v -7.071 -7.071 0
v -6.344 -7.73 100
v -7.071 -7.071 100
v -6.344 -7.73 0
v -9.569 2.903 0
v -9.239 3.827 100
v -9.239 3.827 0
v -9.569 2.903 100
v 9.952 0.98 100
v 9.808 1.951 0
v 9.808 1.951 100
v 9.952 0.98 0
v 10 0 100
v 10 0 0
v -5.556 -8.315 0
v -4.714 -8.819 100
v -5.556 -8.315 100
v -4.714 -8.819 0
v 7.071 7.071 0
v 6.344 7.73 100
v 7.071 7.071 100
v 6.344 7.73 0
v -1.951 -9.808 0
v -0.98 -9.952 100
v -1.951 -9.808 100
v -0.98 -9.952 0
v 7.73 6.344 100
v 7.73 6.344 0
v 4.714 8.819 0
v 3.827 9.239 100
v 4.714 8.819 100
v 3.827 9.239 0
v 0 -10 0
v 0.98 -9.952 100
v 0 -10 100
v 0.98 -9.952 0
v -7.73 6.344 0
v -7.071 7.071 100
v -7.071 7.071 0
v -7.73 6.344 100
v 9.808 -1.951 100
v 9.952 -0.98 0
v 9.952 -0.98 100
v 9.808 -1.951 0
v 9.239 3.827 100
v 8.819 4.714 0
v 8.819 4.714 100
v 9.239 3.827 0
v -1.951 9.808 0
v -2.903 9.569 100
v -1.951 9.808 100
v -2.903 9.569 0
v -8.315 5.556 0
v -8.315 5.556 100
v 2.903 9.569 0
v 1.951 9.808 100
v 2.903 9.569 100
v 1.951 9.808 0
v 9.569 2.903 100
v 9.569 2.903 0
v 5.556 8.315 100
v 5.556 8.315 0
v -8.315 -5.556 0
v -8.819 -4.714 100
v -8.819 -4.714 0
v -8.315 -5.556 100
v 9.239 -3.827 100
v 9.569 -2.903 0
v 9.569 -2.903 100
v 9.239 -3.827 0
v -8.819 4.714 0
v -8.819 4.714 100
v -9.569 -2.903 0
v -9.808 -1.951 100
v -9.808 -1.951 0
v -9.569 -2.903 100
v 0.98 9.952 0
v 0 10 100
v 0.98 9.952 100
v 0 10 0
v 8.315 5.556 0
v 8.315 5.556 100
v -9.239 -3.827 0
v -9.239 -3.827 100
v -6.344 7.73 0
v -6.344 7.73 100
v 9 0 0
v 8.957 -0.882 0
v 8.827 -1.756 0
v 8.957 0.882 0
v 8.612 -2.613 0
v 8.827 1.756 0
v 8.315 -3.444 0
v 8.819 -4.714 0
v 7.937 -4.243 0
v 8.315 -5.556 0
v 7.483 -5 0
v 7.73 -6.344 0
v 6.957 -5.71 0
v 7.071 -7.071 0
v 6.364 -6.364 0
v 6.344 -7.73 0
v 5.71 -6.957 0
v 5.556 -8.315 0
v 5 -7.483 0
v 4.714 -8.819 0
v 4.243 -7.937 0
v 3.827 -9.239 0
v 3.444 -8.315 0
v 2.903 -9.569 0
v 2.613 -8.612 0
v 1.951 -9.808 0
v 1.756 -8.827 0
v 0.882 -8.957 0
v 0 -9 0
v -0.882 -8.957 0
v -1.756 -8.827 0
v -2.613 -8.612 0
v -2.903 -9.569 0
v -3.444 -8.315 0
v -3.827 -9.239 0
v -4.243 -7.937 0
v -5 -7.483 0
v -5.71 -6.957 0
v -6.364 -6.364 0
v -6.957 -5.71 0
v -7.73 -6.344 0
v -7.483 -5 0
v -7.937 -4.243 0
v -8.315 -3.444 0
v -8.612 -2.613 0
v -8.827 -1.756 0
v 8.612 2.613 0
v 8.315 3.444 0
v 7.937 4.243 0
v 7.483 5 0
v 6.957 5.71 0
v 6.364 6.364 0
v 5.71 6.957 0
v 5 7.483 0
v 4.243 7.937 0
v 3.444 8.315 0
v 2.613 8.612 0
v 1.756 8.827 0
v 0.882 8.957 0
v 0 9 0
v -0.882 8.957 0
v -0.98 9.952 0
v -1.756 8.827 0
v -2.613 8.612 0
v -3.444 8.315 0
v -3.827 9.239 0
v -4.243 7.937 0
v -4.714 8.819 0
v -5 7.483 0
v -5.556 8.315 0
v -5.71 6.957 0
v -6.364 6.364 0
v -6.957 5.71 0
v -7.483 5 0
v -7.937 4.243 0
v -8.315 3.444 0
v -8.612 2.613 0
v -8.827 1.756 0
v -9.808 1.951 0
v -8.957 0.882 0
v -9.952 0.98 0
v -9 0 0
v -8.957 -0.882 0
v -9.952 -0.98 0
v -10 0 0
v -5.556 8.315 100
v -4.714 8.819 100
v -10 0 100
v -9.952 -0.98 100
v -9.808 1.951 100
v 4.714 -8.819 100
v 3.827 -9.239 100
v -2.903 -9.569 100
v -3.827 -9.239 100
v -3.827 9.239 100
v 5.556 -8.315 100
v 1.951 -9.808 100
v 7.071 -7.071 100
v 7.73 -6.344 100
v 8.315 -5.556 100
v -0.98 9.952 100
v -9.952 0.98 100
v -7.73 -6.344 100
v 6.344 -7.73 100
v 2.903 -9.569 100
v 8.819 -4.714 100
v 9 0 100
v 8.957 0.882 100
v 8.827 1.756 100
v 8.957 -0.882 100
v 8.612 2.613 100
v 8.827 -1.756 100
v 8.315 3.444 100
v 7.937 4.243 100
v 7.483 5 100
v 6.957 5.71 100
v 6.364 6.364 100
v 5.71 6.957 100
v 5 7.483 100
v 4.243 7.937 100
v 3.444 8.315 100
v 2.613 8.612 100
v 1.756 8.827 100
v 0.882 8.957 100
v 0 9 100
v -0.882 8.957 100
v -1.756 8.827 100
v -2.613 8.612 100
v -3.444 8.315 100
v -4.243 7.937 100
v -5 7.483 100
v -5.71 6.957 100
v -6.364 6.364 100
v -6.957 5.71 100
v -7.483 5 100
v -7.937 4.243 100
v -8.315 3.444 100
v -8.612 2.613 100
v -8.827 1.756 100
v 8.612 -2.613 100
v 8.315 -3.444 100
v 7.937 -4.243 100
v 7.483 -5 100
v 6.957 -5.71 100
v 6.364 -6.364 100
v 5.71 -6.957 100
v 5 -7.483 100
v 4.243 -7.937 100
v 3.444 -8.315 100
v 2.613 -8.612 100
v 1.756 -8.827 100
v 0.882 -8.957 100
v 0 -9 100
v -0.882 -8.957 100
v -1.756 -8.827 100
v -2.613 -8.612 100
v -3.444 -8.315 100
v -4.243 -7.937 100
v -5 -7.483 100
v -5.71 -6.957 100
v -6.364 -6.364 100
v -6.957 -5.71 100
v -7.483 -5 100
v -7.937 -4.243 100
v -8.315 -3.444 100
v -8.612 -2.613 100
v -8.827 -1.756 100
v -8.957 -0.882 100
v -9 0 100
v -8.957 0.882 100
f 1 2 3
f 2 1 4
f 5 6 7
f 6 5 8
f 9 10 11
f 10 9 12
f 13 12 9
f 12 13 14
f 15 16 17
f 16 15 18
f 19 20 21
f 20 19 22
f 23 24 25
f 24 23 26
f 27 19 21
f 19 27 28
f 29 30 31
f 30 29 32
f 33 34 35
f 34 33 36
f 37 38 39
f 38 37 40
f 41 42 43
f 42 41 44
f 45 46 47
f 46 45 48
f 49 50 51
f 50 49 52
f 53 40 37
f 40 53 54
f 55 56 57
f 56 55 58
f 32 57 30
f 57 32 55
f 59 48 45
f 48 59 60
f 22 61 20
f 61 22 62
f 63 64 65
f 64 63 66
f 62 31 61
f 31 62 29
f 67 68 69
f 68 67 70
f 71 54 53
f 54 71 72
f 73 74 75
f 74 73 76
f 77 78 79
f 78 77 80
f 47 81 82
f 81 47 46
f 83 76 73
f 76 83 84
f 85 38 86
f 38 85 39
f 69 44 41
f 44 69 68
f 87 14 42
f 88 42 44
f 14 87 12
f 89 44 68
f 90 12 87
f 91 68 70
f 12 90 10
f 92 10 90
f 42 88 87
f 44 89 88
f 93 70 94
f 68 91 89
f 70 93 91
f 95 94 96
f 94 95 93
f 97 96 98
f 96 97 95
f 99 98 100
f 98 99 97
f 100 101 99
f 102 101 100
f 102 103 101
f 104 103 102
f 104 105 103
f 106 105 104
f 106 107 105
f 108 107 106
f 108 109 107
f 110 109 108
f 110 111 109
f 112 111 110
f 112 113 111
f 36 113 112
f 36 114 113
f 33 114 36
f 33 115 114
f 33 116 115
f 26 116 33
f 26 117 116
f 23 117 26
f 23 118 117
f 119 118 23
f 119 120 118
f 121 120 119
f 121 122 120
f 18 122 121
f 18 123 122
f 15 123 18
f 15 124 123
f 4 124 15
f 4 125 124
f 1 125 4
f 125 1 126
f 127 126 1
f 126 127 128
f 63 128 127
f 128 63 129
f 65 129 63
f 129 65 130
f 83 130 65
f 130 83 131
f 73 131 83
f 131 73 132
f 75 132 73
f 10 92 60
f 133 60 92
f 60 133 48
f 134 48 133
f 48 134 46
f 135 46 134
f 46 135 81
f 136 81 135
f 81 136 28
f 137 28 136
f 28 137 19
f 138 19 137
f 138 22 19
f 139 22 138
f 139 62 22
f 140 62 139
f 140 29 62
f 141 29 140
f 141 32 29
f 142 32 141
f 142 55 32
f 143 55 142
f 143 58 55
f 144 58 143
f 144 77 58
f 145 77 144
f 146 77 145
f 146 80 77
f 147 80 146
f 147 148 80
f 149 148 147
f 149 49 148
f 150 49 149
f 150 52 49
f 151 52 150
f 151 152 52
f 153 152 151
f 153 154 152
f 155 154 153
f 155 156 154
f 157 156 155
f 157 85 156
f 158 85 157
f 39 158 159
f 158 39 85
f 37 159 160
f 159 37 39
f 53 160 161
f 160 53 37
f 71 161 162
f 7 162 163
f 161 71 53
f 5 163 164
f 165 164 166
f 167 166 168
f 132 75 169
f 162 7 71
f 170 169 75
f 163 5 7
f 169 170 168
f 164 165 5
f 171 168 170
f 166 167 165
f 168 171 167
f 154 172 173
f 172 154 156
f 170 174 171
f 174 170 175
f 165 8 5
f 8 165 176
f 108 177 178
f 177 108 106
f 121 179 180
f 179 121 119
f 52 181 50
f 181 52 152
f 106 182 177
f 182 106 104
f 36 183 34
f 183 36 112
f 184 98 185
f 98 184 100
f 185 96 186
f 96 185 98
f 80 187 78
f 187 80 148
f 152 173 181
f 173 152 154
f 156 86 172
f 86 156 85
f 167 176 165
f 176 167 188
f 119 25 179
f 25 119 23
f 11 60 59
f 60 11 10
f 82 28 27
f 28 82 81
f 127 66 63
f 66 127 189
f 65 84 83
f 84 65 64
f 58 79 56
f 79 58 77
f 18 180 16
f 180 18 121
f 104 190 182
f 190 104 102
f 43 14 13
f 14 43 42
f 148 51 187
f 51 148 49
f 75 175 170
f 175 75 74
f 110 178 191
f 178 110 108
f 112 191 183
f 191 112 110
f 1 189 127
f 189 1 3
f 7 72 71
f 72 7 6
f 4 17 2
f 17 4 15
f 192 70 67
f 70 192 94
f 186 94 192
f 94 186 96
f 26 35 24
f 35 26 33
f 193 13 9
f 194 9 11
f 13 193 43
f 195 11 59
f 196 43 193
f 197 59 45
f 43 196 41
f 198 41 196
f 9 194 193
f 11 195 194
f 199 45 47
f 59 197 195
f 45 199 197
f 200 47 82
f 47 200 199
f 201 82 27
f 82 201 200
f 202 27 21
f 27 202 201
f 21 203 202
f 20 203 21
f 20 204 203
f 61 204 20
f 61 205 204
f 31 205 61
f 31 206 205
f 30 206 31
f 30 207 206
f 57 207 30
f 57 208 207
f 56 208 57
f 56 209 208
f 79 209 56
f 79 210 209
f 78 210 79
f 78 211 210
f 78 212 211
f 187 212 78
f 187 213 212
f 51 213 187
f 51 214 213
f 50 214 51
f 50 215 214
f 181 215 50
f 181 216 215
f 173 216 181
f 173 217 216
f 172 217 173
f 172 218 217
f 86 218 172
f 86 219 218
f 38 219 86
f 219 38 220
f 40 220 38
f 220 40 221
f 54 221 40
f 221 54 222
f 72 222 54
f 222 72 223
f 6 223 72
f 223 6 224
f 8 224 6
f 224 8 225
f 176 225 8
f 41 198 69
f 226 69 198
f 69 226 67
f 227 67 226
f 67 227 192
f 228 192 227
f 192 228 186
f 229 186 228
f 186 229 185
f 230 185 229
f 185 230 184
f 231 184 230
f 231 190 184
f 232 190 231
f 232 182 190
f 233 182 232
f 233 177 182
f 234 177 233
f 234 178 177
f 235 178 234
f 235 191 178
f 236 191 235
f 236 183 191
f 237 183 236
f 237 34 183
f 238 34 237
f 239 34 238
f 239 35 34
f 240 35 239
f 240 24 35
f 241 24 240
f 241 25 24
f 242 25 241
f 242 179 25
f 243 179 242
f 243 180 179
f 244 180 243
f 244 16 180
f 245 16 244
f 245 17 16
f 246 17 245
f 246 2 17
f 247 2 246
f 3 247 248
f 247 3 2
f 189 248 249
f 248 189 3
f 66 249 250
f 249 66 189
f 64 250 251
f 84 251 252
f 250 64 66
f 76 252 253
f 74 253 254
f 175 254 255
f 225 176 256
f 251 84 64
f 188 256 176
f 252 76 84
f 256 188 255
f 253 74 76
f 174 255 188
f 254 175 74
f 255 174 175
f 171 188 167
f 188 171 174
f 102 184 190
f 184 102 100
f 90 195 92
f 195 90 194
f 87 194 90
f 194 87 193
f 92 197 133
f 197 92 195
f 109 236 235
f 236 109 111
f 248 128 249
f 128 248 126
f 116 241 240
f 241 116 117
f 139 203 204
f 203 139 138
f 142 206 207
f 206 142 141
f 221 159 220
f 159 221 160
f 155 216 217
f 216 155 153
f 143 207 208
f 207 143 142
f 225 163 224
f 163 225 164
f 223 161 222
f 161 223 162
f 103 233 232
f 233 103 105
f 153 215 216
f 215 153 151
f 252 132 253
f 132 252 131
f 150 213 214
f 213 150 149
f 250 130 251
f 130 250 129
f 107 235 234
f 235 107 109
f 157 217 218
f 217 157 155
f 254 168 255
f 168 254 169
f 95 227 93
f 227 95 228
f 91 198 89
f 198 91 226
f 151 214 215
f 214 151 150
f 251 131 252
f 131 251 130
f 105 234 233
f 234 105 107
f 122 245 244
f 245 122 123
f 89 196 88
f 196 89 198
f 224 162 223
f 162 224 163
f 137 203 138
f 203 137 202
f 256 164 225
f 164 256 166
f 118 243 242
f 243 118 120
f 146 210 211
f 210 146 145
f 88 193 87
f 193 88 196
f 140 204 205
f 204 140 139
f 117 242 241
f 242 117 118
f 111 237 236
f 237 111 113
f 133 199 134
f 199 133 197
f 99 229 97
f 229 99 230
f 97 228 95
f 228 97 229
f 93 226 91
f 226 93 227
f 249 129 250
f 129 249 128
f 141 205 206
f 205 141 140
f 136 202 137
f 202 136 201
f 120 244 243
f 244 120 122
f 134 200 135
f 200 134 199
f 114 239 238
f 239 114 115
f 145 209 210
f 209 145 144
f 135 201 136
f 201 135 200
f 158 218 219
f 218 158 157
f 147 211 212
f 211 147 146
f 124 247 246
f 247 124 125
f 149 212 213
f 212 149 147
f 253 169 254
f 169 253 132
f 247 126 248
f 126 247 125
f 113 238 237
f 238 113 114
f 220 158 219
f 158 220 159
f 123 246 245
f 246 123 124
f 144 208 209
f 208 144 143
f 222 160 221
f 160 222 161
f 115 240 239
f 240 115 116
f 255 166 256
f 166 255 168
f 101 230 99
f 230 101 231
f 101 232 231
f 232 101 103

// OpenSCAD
module pvc_aquarium_tubing(outer_diameter=20, inner_diameter=18, length=100) {
    difference() {
        cylinder(h=length, d=outer_diameter, $fn=64);
        translate([0, 0, -1])
            cylinder(h=length + 2, d=inner_diameter, $fn=64);
    }
}

pvc_aquarium_tubing();
